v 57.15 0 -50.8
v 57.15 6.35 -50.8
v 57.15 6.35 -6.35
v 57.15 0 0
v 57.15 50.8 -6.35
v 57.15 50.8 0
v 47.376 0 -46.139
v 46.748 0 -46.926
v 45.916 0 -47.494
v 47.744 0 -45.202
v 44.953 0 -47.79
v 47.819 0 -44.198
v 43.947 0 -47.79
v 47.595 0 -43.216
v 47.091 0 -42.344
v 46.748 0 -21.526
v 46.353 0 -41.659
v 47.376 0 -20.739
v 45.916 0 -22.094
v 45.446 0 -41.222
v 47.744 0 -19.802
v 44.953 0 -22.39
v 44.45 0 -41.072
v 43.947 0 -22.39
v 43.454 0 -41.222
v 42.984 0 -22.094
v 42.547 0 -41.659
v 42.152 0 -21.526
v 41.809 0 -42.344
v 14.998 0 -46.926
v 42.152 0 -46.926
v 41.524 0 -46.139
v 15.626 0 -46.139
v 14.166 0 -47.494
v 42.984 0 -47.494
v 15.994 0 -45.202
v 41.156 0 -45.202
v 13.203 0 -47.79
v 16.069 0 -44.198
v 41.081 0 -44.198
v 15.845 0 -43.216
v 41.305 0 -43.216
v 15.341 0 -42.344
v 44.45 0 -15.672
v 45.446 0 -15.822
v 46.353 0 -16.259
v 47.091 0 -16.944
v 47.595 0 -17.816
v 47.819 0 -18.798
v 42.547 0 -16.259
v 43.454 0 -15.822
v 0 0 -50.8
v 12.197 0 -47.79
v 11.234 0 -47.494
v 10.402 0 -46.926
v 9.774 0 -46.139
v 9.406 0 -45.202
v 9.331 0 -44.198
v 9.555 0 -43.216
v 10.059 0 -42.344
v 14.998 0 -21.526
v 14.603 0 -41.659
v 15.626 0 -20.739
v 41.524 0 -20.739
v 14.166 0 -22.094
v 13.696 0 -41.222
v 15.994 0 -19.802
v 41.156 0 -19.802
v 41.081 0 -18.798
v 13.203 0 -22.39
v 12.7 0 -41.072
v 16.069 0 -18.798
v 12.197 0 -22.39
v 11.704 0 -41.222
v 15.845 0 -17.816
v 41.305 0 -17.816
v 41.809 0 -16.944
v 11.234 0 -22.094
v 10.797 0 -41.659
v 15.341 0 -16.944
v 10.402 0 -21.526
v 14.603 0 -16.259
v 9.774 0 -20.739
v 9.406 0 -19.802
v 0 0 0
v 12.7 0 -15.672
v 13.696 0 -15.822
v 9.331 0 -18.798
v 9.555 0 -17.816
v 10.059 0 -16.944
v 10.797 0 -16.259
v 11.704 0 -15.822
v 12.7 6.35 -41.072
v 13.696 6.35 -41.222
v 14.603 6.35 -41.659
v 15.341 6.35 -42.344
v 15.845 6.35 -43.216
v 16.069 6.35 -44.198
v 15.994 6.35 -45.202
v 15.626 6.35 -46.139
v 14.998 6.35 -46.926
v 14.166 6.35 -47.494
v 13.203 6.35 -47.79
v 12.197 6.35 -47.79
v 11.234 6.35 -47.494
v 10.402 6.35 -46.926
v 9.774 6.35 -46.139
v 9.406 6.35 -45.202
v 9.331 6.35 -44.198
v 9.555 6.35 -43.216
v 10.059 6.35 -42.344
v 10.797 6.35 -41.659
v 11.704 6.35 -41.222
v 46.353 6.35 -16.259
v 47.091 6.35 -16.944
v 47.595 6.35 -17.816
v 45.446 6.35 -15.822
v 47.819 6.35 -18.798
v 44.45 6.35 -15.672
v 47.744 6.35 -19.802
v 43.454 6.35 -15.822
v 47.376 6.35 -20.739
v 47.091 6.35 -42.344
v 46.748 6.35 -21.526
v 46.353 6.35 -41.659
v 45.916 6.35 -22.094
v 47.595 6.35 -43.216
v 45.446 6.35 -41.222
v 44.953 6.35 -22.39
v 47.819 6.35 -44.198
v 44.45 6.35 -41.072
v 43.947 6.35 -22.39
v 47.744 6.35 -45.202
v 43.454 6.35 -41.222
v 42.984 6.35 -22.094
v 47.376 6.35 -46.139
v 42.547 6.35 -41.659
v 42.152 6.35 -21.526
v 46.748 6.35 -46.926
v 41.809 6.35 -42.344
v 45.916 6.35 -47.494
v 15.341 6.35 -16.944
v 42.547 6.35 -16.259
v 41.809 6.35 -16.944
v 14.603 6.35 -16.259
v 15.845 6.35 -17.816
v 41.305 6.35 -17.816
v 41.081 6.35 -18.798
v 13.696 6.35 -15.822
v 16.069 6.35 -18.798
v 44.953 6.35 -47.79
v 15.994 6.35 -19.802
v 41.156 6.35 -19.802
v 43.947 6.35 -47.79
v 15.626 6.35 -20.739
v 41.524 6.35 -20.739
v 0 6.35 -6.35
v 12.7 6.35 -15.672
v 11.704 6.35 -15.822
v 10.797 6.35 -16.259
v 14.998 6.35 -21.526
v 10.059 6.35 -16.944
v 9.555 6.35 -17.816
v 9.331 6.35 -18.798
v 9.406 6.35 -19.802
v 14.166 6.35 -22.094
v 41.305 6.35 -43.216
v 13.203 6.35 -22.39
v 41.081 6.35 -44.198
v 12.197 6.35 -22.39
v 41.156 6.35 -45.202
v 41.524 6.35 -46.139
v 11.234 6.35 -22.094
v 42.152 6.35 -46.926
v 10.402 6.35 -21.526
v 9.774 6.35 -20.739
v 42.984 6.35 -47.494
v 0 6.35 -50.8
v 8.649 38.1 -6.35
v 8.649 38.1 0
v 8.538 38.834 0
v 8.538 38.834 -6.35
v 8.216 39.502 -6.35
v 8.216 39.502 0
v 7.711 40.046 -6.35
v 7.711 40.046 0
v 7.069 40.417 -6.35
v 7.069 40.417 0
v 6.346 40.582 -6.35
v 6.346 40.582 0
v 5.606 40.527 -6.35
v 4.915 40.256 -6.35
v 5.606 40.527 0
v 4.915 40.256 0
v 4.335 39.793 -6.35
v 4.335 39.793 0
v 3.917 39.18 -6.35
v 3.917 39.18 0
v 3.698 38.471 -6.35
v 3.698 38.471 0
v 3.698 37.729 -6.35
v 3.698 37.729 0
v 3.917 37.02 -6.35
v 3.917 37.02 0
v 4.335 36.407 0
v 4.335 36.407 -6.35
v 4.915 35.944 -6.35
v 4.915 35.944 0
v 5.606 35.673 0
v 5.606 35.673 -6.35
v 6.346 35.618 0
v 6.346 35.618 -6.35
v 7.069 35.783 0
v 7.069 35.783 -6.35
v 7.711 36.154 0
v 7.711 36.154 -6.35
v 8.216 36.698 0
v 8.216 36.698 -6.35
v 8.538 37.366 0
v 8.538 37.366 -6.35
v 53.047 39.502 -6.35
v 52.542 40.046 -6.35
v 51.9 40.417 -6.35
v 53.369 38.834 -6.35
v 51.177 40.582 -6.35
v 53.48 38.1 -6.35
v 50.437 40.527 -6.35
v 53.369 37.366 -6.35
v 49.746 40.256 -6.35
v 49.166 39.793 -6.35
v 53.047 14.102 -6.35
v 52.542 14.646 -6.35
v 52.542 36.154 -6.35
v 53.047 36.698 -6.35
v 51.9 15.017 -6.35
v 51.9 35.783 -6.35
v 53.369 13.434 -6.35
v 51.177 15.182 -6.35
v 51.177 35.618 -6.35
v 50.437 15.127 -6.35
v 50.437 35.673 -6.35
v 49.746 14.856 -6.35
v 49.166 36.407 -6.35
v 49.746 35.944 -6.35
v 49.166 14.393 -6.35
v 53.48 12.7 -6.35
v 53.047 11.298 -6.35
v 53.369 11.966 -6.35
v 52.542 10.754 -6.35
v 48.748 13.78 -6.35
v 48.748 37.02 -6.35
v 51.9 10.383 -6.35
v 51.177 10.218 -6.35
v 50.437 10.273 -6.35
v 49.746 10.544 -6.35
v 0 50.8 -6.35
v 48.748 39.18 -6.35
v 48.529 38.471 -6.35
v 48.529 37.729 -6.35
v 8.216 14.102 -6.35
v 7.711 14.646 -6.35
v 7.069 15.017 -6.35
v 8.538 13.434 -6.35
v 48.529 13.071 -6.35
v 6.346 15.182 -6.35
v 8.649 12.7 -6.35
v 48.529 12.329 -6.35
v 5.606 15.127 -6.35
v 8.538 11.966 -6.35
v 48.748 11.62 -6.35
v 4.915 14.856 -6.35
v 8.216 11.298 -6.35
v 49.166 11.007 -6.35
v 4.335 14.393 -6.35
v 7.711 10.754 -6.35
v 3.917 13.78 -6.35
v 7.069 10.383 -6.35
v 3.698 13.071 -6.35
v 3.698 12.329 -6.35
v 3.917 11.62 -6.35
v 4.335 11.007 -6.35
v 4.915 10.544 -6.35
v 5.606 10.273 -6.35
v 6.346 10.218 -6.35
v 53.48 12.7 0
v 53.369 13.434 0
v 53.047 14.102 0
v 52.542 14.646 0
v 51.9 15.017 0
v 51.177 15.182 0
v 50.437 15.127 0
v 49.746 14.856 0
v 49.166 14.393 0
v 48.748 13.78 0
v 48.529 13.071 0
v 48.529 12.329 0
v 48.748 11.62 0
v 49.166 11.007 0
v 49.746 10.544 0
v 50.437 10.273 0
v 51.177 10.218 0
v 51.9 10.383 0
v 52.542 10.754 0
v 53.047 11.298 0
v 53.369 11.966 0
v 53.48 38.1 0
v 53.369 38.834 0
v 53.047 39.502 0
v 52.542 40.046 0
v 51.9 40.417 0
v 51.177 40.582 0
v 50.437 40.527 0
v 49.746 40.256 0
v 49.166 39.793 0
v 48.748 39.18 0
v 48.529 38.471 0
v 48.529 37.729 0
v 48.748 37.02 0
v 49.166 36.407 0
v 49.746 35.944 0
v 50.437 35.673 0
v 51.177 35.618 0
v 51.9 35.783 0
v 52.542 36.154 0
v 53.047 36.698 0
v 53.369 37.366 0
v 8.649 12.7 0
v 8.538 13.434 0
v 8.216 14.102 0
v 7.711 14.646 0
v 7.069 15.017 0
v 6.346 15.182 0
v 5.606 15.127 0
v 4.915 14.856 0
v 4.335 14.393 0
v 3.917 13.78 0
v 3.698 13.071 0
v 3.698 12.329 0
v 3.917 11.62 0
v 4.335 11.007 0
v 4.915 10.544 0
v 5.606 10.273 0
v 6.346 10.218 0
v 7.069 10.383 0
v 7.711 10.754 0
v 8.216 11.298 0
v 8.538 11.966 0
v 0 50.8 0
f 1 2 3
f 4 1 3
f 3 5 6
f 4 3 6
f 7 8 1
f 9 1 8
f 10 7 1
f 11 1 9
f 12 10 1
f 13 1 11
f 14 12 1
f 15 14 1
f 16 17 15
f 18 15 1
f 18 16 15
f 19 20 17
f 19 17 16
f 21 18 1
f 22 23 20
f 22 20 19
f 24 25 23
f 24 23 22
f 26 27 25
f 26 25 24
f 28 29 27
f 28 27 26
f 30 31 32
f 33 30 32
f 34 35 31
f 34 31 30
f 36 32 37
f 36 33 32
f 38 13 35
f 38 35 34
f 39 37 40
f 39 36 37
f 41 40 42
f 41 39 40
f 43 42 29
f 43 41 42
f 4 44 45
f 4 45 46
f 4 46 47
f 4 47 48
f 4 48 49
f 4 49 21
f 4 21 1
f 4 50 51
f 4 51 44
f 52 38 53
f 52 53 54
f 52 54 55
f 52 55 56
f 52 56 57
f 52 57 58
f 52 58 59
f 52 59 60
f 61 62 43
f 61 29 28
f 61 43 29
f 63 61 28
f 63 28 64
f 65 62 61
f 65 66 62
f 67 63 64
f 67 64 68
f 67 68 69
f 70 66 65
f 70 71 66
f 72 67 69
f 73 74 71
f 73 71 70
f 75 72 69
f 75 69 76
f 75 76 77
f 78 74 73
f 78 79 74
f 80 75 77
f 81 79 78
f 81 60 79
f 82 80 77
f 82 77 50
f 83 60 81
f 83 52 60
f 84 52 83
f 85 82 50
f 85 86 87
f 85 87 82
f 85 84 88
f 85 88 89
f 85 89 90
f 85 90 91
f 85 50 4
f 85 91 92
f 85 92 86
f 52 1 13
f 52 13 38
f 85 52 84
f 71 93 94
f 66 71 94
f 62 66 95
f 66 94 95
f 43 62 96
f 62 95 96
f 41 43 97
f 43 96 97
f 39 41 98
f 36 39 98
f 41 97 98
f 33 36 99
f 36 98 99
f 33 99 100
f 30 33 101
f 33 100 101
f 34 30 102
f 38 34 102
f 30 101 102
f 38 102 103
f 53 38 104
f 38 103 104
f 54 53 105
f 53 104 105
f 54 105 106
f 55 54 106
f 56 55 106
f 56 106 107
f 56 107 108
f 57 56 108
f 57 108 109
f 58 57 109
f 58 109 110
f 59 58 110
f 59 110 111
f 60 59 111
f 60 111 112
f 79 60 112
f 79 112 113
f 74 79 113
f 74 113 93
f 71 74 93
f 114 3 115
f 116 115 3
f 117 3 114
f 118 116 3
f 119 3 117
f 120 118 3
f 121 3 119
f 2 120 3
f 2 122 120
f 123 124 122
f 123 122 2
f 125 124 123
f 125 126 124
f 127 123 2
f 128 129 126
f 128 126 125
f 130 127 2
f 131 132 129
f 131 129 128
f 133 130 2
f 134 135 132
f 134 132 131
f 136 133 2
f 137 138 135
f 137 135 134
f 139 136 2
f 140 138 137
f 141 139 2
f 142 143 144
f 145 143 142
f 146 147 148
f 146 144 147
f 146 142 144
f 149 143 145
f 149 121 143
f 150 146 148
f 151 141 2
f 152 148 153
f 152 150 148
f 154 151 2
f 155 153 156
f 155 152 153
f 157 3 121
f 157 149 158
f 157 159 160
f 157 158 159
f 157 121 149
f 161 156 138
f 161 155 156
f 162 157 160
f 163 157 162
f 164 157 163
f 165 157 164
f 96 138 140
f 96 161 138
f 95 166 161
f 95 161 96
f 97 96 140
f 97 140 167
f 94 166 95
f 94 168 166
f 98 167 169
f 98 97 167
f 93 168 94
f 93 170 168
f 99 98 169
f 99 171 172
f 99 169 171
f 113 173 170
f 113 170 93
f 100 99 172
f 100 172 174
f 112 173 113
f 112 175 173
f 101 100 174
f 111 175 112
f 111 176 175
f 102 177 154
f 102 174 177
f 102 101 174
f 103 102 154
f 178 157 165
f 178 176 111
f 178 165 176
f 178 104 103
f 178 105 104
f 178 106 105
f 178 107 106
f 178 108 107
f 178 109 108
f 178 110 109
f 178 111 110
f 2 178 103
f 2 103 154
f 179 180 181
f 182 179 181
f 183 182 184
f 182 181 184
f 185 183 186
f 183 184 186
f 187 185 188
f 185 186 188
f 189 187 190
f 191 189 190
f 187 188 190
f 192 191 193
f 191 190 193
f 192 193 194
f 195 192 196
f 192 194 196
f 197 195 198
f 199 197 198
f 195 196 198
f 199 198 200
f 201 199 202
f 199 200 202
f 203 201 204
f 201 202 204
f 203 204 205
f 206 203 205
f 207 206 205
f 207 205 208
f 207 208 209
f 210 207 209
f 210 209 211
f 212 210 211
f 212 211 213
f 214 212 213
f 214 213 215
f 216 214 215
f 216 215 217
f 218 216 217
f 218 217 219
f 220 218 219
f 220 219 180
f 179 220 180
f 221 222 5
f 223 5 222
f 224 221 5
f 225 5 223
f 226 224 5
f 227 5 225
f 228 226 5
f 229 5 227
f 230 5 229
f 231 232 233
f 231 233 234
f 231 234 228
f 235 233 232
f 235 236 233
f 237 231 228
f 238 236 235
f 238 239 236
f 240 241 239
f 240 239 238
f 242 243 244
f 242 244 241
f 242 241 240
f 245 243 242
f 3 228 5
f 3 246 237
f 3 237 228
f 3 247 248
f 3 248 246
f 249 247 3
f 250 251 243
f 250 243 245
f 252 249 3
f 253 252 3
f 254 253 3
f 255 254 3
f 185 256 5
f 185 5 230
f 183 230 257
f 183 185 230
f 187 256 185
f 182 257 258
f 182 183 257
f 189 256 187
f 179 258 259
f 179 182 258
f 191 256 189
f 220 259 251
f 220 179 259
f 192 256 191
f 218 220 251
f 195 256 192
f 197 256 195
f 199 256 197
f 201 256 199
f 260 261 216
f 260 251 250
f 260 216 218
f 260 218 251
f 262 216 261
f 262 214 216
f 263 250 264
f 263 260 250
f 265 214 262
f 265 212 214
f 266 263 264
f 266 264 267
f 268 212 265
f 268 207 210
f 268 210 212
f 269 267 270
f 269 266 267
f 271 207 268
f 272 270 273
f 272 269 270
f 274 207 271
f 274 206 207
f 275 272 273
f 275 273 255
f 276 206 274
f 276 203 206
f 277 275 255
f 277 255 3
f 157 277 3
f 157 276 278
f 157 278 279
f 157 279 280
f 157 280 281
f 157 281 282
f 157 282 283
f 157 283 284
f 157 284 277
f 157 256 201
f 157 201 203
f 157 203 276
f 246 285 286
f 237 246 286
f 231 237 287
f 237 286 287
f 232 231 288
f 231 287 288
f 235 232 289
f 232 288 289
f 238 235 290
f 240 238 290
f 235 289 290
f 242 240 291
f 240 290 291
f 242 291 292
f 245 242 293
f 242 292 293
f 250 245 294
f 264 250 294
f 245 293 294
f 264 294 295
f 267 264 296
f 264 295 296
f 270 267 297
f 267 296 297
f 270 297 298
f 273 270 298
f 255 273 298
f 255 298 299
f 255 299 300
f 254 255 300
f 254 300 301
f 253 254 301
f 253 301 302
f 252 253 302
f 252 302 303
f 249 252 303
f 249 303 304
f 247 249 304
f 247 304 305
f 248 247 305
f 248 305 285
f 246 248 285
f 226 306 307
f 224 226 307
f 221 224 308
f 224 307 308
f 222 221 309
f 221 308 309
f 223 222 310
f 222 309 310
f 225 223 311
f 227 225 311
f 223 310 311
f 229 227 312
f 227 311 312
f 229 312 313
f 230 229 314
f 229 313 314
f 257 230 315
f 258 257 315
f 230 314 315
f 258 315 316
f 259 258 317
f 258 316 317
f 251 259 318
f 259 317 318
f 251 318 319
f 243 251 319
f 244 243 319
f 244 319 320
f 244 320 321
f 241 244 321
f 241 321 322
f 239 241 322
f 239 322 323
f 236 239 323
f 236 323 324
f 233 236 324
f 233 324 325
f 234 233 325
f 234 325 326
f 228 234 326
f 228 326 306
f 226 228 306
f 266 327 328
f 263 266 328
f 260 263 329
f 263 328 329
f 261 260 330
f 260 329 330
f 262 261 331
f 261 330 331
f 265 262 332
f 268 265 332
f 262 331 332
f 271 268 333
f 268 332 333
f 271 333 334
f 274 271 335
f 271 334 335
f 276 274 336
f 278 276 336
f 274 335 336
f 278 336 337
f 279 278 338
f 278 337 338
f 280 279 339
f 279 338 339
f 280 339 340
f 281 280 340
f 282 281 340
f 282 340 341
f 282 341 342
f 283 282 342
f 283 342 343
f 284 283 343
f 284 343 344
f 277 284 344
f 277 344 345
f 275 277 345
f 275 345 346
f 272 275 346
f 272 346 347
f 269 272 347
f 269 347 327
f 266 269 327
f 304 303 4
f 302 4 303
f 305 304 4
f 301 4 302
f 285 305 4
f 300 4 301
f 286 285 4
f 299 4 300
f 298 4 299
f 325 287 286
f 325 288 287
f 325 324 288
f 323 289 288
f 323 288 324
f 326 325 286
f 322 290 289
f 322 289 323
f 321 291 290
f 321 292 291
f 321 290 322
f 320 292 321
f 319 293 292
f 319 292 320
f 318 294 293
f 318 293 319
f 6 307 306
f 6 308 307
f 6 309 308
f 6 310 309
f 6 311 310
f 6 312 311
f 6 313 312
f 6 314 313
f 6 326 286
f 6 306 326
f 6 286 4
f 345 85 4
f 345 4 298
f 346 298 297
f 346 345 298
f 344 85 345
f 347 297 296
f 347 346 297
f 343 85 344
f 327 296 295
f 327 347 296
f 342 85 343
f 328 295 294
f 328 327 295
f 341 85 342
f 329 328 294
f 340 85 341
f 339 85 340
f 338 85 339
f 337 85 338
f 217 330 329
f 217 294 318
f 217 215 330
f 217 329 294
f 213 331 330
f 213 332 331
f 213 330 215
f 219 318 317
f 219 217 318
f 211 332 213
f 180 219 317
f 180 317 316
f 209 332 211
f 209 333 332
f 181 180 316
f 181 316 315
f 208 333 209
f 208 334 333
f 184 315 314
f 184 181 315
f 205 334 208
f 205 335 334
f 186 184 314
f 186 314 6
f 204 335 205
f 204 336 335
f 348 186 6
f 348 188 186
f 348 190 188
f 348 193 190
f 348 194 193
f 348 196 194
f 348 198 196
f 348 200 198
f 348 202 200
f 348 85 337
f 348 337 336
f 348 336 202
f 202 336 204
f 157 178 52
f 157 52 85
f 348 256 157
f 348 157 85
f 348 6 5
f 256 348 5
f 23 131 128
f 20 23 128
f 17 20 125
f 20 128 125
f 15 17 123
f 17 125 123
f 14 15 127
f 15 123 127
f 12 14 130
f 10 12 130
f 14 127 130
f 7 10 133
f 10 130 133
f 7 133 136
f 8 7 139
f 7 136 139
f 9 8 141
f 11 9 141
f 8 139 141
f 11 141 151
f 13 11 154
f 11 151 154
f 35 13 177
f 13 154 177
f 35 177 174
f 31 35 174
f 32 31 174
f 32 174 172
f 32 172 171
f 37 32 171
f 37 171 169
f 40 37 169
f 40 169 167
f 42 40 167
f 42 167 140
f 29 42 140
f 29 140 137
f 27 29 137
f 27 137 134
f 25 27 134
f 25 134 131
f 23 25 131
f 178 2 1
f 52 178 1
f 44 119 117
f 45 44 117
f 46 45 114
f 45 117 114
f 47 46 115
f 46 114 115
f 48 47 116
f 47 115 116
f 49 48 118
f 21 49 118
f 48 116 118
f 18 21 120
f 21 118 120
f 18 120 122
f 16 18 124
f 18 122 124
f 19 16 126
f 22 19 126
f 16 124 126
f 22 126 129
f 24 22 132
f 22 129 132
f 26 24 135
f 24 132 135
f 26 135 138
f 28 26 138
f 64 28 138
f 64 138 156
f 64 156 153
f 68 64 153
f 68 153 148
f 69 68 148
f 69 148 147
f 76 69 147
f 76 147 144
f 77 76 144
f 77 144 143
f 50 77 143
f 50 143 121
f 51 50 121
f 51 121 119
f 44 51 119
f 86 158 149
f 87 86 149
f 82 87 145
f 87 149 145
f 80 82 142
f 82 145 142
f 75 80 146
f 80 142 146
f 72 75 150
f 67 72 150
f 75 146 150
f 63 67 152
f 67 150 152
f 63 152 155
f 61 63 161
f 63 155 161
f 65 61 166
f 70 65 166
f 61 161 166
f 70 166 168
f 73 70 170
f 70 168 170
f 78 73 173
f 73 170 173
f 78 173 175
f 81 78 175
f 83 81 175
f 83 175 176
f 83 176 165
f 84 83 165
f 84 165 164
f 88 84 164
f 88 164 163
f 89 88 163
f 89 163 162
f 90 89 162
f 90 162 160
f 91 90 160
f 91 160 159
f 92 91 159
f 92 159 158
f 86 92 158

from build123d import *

# Parameters (mm, degrees)
BOSS_EXTRUDE1_DEPTH = 57.15
SKETCH3_R           = 2.4892
CUT_EXTRUDE1_DEPTH  = 92.800885072
SKETCH4_R           = 3.3782
CUT_EXTRUDE2_DEPTH  = 89.44526556


with BuildPart() as part:
    # Sketch1 → Boss-Extrude1 (new body)
    with BuildSketch(Plane(origin=(0, 0, 0), x_dir=(0, 0, -1), z_dir=(1, 0, 0))):
        Polygon((0, 0), (0, 50.8), (6.35, 50.8), (6.35, 6.35), (50.8, 6.35), (50.8, 0), align=None)
    extrude(amount=BOSS_EXTRUDE1_DEPTH)

    # Sketch3 → Cut-Extrude1 (cut, through all)
    with BuildSketch(Plane.XY):
        with Locations((6.1595, 38.1)):
            Circle(SKETCH3_R)
        with Locations((50.9905, 38.1)):
            Circle(SKETCH3_R)
        with Locations((50.9905, 12.7)):
            Circle(SKETCH3_R)
        with Locations((6.1595, 12.7)):
            Circle(SKETCH3_R)
    extrude(amount=-CUT_EXTRUDE1_DEPTH, mode=Mode.SUBTRACT)

    # Sketch4 → Cut-Extrude2 (cut, through all)
    with BuildSketch(Plane(origin=(0, 6.35, 0), x_dir=(1, 0, 0), z_dir=(0, 1, 0))):
        with Locations(Location((12.7, 19.05, 0), (0, 0, 270))):
            Circle(SKETCH4_R)
        with Locations(Location((12.7, 44.45, 0), (0, 0, 270))):
            Circle(SKETCH4_R)
        with Locations(Location((44.45, 44.45, 0), (0, 0, 270))):
            Circle(SKETCH4_R)
        with Locations(Location((44.45, 19.05, 0), (0, 0, 270))):
            Circle(SKETCH4_R)
    extrude(amount=-CUT_EXTRUDE2_DEPTH, mode=Mode.SUBTRACT)


solid = part.part
